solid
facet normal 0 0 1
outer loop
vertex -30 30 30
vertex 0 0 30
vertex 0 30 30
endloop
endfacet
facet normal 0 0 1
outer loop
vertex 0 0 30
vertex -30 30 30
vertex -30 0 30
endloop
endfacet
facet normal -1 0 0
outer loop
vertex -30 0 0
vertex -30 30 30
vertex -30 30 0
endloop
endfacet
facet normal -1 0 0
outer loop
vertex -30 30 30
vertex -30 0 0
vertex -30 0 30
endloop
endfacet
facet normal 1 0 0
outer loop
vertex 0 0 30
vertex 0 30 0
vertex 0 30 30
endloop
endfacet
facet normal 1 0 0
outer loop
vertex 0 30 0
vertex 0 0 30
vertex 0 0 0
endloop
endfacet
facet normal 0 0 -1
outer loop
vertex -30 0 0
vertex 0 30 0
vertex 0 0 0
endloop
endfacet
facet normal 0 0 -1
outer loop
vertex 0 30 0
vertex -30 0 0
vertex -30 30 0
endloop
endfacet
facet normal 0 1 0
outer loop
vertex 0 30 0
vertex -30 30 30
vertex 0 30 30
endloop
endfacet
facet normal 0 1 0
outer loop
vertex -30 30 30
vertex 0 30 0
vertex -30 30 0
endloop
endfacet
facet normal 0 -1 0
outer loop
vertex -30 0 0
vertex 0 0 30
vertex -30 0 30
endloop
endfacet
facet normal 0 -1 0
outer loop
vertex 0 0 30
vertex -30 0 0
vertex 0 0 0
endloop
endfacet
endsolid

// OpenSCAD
rotate([0,-90,0]){
    difference(){
        cube([30, 30, 30]);
        translate([0,30,0]) {
            cube([30, 30, 30]);
        }
    }
}
